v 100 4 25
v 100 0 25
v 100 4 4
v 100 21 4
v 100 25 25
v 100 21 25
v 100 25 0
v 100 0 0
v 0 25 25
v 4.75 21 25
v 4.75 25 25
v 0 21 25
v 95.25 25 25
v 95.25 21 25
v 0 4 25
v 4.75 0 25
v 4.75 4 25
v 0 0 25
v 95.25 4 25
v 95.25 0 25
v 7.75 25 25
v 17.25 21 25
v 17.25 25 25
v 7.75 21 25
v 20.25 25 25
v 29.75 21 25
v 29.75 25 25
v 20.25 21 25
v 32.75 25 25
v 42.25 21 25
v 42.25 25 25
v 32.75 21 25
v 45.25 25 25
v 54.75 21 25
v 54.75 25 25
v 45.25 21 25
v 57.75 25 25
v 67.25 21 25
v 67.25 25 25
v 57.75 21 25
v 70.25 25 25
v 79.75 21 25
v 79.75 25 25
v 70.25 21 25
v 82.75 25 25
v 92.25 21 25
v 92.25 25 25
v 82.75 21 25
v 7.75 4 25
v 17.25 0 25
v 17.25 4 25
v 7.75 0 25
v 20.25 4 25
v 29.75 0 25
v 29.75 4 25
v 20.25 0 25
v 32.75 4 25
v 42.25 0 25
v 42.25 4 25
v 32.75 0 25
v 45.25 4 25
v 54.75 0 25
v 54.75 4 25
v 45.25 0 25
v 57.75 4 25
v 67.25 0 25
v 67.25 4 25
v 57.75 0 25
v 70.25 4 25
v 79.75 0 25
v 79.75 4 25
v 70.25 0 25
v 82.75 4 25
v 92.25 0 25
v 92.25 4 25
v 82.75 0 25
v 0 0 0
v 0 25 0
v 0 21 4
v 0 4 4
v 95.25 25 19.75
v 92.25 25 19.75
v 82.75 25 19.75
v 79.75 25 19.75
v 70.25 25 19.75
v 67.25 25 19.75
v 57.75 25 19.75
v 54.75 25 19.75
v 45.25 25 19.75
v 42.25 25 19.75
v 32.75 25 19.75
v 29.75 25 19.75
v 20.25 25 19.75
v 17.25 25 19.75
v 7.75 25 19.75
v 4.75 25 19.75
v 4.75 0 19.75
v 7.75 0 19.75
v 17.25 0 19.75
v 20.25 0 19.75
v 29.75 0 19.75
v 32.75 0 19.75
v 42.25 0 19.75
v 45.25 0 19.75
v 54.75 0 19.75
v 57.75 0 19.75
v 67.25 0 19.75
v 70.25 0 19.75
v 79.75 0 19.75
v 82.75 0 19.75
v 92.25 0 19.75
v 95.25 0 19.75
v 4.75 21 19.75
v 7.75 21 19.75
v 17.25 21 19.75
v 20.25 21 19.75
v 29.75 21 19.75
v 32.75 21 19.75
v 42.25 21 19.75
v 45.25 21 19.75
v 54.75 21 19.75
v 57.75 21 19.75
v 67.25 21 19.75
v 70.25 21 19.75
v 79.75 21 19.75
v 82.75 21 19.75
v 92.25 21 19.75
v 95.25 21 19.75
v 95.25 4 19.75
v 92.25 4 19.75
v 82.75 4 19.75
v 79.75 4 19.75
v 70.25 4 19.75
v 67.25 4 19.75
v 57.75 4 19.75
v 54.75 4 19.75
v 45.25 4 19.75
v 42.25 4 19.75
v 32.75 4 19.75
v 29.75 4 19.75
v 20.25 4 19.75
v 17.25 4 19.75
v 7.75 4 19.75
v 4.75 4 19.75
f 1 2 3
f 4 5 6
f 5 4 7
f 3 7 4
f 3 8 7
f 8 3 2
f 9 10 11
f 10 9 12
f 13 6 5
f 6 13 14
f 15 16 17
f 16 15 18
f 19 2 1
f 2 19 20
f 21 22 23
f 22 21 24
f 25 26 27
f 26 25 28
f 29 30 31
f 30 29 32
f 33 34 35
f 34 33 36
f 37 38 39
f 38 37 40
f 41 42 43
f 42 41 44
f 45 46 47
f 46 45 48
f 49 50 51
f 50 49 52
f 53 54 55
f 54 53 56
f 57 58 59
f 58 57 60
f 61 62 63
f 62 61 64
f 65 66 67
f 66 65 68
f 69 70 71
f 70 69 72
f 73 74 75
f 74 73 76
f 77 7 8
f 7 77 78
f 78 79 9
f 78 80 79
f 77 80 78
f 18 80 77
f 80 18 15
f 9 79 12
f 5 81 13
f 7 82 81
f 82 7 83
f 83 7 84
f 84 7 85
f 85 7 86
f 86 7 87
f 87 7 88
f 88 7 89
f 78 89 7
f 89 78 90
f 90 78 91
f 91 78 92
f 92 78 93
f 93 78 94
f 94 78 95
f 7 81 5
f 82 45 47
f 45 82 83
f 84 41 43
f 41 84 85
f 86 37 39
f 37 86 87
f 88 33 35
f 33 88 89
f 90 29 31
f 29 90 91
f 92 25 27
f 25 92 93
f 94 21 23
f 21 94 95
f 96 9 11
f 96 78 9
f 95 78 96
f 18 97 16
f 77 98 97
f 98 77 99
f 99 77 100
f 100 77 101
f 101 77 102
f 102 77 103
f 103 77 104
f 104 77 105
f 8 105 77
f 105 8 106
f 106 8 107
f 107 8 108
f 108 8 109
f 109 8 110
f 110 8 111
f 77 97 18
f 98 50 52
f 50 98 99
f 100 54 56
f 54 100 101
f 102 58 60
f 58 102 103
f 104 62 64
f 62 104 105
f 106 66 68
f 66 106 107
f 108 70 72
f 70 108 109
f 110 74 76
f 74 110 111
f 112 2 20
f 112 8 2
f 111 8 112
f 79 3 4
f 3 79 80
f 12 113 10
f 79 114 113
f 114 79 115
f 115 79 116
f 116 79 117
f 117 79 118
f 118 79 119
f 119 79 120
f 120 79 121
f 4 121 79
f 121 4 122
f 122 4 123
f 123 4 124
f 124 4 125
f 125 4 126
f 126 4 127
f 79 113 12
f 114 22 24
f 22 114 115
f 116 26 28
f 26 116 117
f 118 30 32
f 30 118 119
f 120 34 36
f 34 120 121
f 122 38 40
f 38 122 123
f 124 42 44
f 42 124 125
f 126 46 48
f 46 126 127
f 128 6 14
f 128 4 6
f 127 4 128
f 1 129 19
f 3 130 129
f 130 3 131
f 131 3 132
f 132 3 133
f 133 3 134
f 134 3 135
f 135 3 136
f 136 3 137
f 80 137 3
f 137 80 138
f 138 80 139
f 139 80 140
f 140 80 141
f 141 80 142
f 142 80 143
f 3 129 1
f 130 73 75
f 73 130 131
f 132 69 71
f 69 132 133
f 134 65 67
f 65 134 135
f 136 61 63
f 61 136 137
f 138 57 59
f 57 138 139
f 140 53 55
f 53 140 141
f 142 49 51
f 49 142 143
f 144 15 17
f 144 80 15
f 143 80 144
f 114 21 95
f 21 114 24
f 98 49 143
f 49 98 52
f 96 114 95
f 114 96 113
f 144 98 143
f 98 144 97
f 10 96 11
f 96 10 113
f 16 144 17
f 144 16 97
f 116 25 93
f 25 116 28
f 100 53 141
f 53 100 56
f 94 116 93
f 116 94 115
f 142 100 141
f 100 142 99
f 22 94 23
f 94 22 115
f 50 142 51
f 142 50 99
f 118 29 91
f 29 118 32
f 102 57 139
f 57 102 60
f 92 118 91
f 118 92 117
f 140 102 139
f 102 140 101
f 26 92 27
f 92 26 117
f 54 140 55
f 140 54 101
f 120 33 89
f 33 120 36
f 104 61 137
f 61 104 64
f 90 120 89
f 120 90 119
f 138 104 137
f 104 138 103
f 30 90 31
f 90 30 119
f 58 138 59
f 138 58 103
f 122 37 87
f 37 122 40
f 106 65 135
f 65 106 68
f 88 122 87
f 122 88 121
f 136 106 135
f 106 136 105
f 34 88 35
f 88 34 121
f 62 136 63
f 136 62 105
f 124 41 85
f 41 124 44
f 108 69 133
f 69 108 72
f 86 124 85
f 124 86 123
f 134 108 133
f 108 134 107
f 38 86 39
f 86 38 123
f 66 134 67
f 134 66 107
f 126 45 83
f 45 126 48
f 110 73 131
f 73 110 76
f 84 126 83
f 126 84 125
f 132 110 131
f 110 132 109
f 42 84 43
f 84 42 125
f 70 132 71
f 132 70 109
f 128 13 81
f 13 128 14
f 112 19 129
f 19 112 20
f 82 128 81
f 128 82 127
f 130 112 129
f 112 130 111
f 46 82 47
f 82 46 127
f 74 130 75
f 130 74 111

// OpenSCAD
$fn = 32;

// ----------------------------------------------------------------------
// Cable duct: 100 x 25 x 25 mm, 8 fingers
// ----------------------------------------------------------------------

// --- parameters (mm) ---
tray_len = 100;           // duct length, X
tray_w = 25;              // duct width, Y
tray_h = 25;              // duct height, Z
tray_t = 4;               // side wall thickness
floor_t = 4;              // floor thickness
slot_w = 3;               // finger slot width
slot_h = 15.75;           // finger slot height
fingers = 8;              // number of finger slots per side
pitch = 12.5;             // finger pitch

module shell() {
  difference() {
    cube([tray_len, tray_w, tray_h]);
    /* open top channel */
    translate([-tray_t - 1, tray_t, floor_t])
      cube([tray_len + 2 * tray_t + 2, tray_w - 2 * tray_t, tray_h + 1]);
  }
}

difference() {
  union() {
    shell();
  }
  /* finger slots cut through both side walls */
  for (i = [0 : fingers - 1]) translate([pitch / 2 + i * pitch - slot_w / 2, -1, floor_t + slot_h]) cube([slot_w, tray_w + 2, tray_h]);
}
